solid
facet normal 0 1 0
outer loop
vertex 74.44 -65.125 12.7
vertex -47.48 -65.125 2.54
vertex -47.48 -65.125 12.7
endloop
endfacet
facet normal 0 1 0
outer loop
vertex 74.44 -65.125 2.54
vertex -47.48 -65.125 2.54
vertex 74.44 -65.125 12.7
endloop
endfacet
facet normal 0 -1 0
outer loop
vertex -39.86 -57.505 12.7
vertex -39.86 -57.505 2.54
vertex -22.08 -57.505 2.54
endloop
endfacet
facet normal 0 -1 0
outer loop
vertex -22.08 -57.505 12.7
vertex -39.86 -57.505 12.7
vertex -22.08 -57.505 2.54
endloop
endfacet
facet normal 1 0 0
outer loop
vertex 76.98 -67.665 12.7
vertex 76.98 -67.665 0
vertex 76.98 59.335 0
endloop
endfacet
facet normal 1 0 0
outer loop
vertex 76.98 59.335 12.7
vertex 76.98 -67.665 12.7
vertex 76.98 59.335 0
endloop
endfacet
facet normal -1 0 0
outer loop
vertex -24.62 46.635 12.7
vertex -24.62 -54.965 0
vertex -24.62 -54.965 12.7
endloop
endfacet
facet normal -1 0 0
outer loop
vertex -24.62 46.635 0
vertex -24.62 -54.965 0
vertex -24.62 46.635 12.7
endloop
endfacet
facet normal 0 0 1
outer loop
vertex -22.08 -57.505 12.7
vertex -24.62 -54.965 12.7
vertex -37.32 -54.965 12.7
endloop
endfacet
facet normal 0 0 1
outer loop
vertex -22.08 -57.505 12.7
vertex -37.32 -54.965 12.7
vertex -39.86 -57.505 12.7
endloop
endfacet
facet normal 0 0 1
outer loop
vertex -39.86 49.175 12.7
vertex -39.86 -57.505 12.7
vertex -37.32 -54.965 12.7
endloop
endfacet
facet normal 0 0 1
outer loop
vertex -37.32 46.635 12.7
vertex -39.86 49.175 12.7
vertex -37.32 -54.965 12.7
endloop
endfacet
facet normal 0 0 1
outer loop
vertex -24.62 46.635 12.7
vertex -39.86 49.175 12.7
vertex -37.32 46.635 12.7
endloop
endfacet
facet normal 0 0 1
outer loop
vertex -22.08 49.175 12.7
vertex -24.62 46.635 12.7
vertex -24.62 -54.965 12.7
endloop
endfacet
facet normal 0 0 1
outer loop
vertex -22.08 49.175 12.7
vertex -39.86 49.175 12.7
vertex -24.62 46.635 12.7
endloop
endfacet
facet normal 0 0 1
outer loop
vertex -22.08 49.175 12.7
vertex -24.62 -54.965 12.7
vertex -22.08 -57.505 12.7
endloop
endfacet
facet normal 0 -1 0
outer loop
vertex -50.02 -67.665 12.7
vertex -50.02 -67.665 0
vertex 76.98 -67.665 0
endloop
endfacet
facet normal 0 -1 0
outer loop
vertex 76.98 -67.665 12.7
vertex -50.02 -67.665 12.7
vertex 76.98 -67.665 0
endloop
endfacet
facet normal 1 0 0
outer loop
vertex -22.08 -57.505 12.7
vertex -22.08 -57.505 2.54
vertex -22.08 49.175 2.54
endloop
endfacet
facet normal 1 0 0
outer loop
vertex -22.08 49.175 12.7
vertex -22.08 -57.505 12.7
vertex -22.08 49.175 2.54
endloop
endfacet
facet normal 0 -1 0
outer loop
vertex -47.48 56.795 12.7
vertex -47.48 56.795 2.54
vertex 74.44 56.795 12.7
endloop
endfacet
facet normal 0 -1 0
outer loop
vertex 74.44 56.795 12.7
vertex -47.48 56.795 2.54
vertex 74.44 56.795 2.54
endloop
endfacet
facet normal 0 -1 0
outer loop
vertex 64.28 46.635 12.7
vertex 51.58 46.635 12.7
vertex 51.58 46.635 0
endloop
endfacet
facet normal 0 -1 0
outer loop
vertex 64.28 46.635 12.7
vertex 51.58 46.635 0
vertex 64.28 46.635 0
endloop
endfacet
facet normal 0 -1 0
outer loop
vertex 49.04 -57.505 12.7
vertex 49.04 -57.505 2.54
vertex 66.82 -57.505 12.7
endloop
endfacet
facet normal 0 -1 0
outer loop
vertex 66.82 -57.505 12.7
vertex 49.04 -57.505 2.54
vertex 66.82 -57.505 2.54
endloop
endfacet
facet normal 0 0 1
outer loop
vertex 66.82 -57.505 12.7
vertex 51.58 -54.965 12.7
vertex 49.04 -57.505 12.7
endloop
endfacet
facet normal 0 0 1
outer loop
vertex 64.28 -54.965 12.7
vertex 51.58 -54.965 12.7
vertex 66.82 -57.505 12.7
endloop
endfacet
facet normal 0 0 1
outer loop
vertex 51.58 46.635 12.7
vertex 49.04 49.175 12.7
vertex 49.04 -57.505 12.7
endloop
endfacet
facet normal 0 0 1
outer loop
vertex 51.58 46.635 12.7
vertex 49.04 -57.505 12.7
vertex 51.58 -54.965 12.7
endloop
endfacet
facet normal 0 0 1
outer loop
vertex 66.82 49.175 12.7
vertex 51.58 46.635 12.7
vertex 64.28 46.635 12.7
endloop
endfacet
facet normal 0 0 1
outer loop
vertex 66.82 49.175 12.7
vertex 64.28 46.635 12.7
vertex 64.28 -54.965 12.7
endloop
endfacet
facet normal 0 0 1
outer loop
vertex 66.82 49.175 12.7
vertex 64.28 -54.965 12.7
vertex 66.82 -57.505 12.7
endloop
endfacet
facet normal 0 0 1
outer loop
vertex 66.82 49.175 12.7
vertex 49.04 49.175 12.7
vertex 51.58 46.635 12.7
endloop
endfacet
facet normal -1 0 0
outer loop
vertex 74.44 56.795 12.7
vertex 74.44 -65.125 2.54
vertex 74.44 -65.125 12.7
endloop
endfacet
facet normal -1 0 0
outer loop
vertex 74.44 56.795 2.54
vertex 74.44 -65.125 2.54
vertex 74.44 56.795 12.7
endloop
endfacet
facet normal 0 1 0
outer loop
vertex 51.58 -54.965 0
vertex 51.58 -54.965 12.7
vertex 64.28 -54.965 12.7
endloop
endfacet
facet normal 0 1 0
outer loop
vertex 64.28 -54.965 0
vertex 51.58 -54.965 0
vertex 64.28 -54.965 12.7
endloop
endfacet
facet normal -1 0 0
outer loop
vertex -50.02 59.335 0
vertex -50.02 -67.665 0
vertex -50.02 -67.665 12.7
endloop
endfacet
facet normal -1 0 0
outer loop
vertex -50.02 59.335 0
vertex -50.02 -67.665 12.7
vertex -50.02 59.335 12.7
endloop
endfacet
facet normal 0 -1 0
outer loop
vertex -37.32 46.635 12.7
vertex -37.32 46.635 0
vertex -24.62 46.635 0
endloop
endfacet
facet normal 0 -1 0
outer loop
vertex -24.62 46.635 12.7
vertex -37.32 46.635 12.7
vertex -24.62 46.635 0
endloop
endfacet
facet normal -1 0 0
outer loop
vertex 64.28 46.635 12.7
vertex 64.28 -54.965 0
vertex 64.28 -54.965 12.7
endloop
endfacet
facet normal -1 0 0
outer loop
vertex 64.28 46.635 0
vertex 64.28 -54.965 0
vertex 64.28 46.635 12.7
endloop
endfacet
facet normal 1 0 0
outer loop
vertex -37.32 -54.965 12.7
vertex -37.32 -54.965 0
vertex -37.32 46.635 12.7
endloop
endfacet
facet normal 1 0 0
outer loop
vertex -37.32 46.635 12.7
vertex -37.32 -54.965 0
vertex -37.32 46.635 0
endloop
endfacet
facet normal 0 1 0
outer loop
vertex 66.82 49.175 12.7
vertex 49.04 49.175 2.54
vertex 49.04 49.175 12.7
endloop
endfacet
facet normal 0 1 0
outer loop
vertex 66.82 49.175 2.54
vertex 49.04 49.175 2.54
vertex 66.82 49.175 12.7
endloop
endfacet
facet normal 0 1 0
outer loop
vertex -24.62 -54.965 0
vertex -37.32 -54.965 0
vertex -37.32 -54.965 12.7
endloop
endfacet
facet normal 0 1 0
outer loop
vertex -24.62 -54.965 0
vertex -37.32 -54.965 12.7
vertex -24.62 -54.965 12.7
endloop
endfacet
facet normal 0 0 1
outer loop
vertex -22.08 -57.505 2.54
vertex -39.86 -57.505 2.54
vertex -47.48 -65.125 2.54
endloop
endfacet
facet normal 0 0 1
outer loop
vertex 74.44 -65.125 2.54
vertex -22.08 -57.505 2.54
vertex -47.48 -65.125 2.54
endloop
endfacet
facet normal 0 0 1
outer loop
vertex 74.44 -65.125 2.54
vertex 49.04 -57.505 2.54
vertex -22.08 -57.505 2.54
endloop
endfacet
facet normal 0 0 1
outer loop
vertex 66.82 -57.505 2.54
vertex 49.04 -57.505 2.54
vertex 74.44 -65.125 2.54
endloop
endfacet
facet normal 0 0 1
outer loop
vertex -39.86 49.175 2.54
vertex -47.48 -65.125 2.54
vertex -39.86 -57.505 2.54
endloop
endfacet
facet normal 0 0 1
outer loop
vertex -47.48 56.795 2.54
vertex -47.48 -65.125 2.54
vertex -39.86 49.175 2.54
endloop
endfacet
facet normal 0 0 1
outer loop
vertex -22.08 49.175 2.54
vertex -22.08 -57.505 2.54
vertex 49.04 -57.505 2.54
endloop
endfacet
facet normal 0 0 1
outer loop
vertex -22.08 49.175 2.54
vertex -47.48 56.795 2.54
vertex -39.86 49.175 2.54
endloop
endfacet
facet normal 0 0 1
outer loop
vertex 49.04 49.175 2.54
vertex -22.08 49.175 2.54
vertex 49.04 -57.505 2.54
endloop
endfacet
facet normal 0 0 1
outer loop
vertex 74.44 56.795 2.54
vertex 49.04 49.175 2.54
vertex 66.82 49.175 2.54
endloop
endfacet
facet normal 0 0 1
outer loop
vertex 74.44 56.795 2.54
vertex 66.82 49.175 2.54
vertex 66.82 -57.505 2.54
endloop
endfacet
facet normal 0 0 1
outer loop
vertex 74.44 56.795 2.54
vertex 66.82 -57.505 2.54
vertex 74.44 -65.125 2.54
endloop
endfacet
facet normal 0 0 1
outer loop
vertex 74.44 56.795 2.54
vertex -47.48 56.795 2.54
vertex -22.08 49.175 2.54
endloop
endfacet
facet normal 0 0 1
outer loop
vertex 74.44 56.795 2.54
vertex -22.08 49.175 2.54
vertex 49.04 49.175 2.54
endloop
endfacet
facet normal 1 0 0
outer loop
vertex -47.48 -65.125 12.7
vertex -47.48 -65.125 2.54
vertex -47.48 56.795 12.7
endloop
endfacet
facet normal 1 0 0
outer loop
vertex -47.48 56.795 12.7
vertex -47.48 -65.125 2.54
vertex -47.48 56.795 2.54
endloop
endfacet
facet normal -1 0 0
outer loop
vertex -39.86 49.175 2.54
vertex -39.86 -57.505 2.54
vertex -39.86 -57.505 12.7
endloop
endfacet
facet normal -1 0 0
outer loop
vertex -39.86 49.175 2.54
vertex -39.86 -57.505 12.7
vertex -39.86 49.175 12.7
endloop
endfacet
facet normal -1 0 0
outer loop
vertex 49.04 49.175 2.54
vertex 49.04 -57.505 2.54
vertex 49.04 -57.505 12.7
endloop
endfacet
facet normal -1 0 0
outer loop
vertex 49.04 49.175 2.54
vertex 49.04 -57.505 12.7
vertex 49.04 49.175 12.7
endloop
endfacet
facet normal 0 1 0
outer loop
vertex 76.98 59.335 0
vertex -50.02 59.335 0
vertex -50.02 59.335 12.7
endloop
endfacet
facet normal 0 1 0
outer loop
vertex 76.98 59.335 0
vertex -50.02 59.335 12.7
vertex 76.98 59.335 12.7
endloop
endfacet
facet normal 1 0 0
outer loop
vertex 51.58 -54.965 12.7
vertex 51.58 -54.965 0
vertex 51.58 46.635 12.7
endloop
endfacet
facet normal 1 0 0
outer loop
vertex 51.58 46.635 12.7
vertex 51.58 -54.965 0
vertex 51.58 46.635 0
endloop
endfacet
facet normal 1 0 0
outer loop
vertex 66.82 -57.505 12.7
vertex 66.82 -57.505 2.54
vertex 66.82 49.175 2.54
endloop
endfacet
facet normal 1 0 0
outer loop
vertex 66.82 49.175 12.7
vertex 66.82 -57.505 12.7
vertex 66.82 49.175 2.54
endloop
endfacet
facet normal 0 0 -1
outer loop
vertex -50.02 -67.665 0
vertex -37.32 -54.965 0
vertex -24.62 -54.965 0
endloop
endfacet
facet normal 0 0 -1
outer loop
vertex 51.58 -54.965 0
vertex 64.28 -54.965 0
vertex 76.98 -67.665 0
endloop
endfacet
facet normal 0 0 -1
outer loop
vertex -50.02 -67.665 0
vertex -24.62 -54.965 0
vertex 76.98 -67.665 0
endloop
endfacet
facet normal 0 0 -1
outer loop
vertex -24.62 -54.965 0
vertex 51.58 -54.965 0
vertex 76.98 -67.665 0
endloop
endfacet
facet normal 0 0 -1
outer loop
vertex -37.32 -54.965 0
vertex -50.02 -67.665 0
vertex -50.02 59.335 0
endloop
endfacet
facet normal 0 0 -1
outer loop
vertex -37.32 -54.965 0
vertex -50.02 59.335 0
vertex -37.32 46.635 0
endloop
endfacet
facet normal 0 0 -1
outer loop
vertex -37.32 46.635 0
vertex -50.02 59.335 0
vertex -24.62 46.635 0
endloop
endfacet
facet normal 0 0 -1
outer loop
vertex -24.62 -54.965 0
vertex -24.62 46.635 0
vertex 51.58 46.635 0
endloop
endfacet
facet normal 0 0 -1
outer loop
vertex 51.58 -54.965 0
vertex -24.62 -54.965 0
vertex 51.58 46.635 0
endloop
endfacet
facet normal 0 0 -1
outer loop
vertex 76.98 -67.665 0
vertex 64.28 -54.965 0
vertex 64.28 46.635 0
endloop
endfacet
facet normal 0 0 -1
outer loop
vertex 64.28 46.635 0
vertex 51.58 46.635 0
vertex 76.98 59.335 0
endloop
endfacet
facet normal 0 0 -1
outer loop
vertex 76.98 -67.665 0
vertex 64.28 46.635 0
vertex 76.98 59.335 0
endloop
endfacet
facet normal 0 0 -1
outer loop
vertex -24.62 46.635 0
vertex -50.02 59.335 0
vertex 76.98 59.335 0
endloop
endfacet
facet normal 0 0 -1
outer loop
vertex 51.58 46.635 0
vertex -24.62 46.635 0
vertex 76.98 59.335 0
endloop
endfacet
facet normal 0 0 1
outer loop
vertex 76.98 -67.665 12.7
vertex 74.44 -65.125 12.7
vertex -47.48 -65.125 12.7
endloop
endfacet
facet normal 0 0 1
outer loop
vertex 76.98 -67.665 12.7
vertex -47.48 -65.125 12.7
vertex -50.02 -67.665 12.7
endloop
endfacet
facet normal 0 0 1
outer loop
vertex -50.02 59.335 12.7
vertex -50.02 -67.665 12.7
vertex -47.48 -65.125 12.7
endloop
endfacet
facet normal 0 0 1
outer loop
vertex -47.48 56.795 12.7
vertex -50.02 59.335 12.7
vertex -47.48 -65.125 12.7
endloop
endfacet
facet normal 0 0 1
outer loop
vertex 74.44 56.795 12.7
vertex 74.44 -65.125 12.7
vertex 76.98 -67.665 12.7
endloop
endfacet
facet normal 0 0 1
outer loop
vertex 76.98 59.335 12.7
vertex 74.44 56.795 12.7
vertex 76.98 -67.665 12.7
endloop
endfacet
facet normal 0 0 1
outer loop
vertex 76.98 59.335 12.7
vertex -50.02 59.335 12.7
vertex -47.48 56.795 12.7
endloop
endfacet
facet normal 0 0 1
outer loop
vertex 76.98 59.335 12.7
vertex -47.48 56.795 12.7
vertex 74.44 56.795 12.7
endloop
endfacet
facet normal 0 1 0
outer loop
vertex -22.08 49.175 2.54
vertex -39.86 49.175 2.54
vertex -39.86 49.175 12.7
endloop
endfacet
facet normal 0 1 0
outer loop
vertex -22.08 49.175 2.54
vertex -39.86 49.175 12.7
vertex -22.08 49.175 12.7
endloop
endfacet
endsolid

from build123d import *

# Parameters (mm, degrees)
F0_W     = 127
F0_H     = 127
F0_W_2   = 12.7
F0_H_2   = 101.6
F1_DEPTH = 12.7
F2_T     = -2.54


with BuildPart() as f1:
    # F0 (on Top) → F1 (new body)
    with BuildSketch(Plane.XY):
        with Locations((13.4799859107, -4.1653172493)):
            Rectangle(F0_W, F0_H)
        with Locations((-30.9700140893, -4.1653172493)):
            Rectangle(F0_W_2, F0_H_2, mode=Mode.SUBTRACT)
        with Locations((57.9299859107, -4.1653172493)):
            Rectangle(F0_W_2, F0_H_2, mode=Mode.SUBTRACT)
    extrude(amount=F1_DEPTH)

    # F2
    f2_openings = [f1.faces().sort_by_distance(p)[0] for p in [
        (13.479986, -4.165317, 12.7),
    ]]
    offset(amount=F2_T, openings=f2_openings, kind=Kind.INTERSECTION)


solid = f1.part
